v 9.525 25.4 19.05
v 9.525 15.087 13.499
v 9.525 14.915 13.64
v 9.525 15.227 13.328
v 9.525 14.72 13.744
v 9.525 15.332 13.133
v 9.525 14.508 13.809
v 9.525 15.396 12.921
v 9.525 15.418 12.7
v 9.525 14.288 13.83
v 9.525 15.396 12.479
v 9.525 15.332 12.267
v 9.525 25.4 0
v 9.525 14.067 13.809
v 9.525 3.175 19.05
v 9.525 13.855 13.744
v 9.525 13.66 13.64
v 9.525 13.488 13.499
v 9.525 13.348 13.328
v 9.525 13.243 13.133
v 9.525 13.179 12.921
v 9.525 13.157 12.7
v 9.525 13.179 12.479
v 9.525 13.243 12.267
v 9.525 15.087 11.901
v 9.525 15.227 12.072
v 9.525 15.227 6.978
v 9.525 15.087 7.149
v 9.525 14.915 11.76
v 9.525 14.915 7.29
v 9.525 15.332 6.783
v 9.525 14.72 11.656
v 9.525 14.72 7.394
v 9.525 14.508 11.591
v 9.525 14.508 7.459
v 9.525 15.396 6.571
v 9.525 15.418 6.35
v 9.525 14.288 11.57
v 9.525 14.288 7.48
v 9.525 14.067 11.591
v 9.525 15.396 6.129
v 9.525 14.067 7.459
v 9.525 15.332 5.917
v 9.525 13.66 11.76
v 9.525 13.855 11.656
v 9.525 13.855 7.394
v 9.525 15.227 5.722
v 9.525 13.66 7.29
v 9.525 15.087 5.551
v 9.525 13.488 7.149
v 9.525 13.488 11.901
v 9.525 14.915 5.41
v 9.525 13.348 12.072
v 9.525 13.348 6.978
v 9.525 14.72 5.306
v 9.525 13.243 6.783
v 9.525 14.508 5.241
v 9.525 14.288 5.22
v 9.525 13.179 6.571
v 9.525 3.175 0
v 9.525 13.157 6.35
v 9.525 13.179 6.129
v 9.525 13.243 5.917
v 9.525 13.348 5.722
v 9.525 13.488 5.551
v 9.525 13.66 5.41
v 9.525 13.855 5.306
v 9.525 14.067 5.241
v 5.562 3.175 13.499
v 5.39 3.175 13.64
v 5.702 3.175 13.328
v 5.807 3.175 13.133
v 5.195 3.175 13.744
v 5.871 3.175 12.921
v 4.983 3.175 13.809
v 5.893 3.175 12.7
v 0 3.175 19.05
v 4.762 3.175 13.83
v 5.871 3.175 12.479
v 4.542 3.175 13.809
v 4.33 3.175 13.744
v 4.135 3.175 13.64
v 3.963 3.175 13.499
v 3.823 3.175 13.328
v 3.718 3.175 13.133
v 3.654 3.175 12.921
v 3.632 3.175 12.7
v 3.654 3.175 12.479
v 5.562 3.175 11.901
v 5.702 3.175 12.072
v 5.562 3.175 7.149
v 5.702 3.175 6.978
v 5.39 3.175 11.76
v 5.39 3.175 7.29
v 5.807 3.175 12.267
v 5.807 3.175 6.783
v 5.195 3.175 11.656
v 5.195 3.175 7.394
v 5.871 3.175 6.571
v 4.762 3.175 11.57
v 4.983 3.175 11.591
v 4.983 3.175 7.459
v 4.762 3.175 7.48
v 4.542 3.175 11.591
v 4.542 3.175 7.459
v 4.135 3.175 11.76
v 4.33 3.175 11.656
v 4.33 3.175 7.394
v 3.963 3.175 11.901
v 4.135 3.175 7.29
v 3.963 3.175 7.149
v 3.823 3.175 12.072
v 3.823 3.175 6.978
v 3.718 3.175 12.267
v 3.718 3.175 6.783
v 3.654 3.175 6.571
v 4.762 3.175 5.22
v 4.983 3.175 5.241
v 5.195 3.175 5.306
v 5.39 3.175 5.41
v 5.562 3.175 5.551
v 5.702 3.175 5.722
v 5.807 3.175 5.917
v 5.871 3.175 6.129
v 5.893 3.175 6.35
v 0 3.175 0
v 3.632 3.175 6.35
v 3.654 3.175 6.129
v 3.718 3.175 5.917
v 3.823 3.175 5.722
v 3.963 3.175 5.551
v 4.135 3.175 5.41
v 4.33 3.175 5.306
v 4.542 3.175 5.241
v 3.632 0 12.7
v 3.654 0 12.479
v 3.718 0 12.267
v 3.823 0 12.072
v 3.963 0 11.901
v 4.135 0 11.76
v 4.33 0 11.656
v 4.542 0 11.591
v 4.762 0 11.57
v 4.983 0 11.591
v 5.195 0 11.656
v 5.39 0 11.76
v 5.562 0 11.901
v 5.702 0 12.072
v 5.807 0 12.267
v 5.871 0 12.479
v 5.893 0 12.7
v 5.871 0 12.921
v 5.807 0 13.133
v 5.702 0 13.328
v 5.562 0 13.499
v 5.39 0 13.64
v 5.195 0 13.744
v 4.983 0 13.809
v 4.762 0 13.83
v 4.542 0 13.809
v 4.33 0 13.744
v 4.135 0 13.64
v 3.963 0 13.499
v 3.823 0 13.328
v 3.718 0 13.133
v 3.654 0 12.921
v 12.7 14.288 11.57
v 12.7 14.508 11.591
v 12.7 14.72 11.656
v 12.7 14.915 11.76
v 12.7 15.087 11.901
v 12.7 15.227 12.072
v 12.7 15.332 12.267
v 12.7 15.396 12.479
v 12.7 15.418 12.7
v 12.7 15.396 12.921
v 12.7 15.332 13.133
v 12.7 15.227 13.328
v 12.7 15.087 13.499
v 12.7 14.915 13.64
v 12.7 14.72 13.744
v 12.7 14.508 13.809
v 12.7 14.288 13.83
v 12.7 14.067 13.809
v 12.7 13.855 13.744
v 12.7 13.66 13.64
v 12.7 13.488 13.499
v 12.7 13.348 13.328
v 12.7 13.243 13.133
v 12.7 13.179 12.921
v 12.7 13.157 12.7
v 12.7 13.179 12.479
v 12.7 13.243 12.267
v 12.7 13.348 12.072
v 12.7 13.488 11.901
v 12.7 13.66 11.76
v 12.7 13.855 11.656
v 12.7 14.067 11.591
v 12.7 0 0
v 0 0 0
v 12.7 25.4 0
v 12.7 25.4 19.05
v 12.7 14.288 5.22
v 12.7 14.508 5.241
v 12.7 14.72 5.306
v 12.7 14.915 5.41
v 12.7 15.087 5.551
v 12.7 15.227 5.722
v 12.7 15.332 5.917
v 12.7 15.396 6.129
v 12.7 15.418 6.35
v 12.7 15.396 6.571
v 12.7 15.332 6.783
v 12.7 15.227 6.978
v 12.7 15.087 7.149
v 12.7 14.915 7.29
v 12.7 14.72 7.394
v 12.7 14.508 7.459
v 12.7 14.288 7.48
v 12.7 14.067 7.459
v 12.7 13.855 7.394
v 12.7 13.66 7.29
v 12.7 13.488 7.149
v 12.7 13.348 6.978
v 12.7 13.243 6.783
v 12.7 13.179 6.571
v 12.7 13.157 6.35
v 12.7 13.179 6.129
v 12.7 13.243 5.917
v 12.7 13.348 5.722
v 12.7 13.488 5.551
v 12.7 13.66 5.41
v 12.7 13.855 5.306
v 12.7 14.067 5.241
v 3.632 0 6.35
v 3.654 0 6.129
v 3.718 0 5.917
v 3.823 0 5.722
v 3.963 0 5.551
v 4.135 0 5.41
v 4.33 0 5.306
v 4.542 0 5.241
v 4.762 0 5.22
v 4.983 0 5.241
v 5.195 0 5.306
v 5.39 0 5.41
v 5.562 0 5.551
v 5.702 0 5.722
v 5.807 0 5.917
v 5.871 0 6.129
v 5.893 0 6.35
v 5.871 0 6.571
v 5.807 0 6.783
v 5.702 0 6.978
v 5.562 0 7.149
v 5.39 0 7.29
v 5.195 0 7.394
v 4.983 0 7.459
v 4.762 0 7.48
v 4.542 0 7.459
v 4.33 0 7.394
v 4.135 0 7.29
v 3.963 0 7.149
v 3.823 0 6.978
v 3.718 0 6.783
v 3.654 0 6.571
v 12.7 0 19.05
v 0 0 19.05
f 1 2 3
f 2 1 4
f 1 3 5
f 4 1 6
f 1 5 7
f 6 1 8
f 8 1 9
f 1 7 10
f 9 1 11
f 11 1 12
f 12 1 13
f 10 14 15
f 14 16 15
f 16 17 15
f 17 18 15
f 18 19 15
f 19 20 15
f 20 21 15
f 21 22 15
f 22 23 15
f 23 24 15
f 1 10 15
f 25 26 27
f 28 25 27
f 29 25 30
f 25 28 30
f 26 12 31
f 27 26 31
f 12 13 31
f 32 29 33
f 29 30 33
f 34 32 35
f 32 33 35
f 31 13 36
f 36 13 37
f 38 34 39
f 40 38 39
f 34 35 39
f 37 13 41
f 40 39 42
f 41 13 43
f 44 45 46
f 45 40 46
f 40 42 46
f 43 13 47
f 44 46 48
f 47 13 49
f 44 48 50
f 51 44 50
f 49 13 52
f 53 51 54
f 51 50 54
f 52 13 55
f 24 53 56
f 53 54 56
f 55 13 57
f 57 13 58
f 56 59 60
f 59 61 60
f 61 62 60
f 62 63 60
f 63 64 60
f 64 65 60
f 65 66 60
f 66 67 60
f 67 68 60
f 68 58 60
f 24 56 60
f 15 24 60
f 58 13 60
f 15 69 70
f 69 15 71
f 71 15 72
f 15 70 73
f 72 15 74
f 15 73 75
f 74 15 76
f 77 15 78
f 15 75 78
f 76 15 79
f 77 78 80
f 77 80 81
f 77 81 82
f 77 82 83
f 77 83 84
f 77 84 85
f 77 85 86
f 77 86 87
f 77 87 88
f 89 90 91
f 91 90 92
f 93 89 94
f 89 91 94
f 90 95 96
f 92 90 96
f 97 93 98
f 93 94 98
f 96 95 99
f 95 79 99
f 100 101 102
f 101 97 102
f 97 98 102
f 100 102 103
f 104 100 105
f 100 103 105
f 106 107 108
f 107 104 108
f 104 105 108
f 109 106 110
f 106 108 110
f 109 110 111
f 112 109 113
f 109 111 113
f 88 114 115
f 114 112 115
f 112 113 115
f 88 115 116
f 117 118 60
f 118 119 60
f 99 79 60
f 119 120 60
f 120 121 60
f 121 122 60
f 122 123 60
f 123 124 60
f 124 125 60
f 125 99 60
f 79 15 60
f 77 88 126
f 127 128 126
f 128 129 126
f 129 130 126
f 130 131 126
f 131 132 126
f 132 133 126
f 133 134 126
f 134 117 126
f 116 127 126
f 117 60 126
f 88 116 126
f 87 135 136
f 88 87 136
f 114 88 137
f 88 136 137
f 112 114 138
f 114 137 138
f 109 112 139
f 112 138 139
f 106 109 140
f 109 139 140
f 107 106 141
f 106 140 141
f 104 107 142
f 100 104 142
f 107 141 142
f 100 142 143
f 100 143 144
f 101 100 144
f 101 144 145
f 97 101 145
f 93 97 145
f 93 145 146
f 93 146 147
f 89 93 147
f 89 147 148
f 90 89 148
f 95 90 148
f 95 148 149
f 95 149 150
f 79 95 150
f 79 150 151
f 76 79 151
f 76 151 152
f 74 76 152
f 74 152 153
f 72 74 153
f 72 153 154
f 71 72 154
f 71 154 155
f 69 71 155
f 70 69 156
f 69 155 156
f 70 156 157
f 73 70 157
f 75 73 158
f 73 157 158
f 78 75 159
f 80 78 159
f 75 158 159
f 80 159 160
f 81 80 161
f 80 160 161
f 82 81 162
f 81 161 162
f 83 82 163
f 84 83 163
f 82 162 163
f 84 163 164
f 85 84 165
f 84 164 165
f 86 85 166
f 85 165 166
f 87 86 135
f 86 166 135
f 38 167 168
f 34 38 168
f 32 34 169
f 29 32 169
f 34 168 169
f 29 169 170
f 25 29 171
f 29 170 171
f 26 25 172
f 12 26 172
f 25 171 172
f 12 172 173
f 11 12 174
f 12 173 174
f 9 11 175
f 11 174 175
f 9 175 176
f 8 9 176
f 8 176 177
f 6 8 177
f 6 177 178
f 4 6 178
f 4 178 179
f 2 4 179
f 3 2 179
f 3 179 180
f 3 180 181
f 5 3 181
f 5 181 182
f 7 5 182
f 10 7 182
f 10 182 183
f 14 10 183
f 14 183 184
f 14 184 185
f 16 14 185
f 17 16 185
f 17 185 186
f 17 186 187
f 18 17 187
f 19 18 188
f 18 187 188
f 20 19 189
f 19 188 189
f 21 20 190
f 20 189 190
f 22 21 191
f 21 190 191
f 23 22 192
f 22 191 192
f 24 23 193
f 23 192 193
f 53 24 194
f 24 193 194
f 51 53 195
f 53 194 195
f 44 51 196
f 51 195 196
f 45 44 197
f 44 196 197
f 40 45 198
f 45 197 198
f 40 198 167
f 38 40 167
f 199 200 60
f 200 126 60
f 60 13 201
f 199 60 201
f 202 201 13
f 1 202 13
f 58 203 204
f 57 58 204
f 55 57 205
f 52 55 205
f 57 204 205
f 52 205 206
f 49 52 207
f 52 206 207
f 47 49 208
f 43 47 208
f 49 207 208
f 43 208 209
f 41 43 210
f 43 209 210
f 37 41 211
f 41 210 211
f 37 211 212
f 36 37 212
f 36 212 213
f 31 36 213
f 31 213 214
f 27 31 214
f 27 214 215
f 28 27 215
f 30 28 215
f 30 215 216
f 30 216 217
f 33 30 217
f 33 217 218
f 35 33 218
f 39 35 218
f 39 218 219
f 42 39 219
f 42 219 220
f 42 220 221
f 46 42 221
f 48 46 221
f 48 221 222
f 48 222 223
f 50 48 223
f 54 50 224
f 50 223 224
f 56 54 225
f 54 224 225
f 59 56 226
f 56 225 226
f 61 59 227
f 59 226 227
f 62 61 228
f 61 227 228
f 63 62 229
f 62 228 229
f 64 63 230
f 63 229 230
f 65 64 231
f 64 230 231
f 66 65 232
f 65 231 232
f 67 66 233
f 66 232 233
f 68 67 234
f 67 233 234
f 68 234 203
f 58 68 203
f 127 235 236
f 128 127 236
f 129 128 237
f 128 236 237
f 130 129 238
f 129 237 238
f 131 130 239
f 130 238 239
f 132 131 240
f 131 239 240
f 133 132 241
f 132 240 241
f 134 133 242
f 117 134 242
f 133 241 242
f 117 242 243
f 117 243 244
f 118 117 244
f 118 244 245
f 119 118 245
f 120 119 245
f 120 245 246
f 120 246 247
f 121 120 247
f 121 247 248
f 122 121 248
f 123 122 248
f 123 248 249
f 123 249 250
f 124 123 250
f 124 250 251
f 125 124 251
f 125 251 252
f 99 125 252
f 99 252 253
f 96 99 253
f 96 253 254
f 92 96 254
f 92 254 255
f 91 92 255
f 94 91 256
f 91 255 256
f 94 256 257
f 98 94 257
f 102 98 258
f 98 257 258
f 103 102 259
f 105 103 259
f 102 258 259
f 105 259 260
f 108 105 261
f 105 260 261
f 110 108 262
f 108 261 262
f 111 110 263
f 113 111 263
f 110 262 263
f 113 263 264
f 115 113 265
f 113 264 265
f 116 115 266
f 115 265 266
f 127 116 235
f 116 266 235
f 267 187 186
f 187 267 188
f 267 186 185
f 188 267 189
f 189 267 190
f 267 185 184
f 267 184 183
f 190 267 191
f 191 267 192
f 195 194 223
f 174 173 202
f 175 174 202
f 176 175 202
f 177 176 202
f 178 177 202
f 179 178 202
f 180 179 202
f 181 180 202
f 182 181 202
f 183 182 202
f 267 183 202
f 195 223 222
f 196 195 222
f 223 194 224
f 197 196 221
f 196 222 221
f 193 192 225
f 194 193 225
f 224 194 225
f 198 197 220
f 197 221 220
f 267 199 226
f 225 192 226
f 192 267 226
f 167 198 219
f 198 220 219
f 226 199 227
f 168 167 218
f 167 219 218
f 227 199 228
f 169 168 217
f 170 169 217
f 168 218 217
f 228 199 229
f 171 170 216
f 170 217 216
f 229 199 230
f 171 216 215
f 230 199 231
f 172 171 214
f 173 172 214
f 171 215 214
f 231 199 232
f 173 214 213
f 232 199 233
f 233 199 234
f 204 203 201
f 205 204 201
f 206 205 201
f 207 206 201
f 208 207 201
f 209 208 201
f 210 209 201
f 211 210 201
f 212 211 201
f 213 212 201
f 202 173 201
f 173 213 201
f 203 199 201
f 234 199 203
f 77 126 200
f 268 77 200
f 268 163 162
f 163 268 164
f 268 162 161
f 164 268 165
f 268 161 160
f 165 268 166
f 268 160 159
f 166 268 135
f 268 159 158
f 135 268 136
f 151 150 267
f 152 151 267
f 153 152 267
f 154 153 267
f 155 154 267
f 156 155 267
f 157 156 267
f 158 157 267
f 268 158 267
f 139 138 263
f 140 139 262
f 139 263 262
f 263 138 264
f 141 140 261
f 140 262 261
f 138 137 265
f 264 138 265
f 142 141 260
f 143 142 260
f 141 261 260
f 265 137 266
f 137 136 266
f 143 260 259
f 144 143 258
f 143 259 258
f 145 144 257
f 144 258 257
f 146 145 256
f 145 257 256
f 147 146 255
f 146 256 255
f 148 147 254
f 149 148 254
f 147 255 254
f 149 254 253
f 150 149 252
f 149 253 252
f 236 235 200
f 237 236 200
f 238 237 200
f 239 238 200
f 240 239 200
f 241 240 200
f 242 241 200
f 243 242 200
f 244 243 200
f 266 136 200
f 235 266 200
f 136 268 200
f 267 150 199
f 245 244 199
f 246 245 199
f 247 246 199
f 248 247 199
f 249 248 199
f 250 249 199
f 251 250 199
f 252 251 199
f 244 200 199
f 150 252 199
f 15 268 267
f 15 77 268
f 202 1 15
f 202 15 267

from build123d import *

# Parameters (mm, degrees)
BOSS_EXTRUDE1_DEPTH       = 19.05
F_4_40_TAPPED_HOLE1_D     = 2.2606
F_4_40_TAPPED_HOLE1_DEPTH = 7.5946
F_4_40_TAPPED_HOLE1_TIP   = 0.679152758
F_4_40_TAPPED_HOLE2_D     = 2.2606
F_4_40_TAPPED_HOLE2_DEPTH = 7.5946
F_4_40_TAPPED_HOLE2_TIP   = 0.679152758


with BuildPart() as part:
    # Sketch1 → Boss-Extrude1 (new body)
    with BuildSketch(Plane.XY):
        Polygon((0, 0), (12.7, 0), (12.7, 25.4), (9.525, 25.4), (9.525, 3.175), (0, 3.175), align=None)
    extrude(amount=BOSS_EXTRUDE1_DEPTH)

    # #4-40 Tapped Hole1
    with Locations(Plane.ZY.offset(-9.525)):
        with Locations((6.35, 14.2875), (12.7, 14.2875)):
            Hole(F_4_40_TAPPED_HOLE1_D / 2, depth=F_4_40_TAPPED_HOLE1_DEPTH)
            with Locations((0, 0, -(F_4_40_TAPPED_HOLE1_DEPTH + F_4_40_TAPPED_HOLE1_TIP / 2))):  # 118° drill point
                Cone(0, F_4_40_TAPPED_HOLE1_D / 2, F_4_40_TAPPED_HOLE1_TIP, mode=Mode.SUBTRACT)

    # #4-40 Tapped Hole2
    with Locations(Plane(origin=(0, 3.175, 0), x_dir=(1, 0, 0), z_dir=(0, 1, 0))):
        with Locations((4.7625, -6.35), (4.7625, -12.7)):
            Hole(F_4_40_TAPPED_HOLE2_D / 2, depth=F_4_40_TAPPED_HOLE2_DEPTH)
            with Locations((0, 0, -(F_4_40_TAPPED_HOLE2_DEPTH + F_4_40_TAPPED_HOLE2_TIP / 2))):  # 118° drill point
                Cone(0, F_4_40_TAPPED_HOLE2_D / 2, F_4_40_TAPPED_HOLE2_TIP, mode=Mode.SUBTRACT)


solid = part.part
